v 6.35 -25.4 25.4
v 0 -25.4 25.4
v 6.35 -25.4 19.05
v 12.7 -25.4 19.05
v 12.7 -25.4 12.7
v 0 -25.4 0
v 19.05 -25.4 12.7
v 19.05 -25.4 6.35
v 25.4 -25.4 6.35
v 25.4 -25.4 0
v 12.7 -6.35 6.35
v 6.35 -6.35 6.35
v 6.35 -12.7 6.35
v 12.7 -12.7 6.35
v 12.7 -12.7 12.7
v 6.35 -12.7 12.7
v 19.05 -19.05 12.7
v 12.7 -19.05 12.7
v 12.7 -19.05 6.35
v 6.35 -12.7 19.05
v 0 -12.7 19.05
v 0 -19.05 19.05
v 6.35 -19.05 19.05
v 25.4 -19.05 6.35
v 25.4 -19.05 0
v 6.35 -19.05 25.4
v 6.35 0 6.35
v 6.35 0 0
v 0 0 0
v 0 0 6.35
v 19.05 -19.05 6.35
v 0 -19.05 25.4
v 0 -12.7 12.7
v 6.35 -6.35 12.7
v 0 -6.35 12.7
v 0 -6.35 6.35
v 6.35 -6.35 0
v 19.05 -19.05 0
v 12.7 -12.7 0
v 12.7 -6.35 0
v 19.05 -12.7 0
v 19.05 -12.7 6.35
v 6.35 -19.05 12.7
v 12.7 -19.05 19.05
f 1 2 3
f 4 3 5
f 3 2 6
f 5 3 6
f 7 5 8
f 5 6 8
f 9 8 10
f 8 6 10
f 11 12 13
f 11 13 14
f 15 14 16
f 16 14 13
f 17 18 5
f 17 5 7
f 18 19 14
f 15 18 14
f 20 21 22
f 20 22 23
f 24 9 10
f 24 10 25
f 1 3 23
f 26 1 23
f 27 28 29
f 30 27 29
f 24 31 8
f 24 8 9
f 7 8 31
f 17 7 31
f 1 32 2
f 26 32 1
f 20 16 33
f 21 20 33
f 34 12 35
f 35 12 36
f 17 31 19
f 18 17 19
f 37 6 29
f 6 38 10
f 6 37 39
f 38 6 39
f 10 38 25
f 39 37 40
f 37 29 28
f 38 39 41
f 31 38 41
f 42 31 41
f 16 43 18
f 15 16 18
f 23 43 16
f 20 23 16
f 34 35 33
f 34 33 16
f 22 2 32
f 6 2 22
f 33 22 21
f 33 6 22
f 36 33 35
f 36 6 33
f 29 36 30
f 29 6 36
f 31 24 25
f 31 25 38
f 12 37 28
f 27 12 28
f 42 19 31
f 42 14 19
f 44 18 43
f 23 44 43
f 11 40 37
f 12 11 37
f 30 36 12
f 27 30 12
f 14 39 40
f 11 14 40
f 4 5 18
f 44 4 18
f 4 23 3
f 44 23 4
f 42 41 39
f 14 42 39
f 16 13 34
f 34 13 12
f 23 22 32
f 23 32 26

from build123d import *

# Parameters (mm, degrees)
F1_DEPTH = 6.35
F3_DEPTH = 6.35
F5_DEPTH = 6.35
F6_W     = 6.35
F6_H     = 6.35
F7_DEPTH = 6.35


with BuildPart() as f1:
    # F0 (on Top) → F1 (new body)
    with BuildSketch(Plane.XY):
        Polygon((0, 0), (0, -25.4), (25.4, -25.4), (25.4, -19.05), (19.05, -19.05), (19.05, -12.7), (12.7, -12.7), (12.7, -6.35), (6.35, -6.35), (6.35, 0), align=None)
    extrude(amount=F1_DEPTH)

    # F2 (on face) → F3 (join)
    with BuildSketch(Plane.XY.offset(6.35)):
        Polygon((6.35, -6.35), (0, -6.35), (0, -25.4), (19.05, -25.4), (19.05, -19.05), (12.7, -19.05), (12.7, -12.7), (6.35, -12.7), align=None)
    extrude(amount=F3_DEPTH)

    # F4 (on face) → F5 (join)
    with BuildSketch(Plane.XY.offset(12.7)):
        Polygon((6.35, -12.7), (0, -12.7), (0, -25.4), (12.7, -25.4), (12.7, -19.05), (6.35, -19.05), align=None)
    extrude(amount=F5_DEPTH)

    # F6 (on face) → F7 (join)
    with BuildSketch(Plane.XY.offset(19.05)):
        with Locations((3.175, -22.225)):
            Rectangle(F6_W, F6_H)
    extrude(amount=F7_DEPTH)


solid = f1.part
